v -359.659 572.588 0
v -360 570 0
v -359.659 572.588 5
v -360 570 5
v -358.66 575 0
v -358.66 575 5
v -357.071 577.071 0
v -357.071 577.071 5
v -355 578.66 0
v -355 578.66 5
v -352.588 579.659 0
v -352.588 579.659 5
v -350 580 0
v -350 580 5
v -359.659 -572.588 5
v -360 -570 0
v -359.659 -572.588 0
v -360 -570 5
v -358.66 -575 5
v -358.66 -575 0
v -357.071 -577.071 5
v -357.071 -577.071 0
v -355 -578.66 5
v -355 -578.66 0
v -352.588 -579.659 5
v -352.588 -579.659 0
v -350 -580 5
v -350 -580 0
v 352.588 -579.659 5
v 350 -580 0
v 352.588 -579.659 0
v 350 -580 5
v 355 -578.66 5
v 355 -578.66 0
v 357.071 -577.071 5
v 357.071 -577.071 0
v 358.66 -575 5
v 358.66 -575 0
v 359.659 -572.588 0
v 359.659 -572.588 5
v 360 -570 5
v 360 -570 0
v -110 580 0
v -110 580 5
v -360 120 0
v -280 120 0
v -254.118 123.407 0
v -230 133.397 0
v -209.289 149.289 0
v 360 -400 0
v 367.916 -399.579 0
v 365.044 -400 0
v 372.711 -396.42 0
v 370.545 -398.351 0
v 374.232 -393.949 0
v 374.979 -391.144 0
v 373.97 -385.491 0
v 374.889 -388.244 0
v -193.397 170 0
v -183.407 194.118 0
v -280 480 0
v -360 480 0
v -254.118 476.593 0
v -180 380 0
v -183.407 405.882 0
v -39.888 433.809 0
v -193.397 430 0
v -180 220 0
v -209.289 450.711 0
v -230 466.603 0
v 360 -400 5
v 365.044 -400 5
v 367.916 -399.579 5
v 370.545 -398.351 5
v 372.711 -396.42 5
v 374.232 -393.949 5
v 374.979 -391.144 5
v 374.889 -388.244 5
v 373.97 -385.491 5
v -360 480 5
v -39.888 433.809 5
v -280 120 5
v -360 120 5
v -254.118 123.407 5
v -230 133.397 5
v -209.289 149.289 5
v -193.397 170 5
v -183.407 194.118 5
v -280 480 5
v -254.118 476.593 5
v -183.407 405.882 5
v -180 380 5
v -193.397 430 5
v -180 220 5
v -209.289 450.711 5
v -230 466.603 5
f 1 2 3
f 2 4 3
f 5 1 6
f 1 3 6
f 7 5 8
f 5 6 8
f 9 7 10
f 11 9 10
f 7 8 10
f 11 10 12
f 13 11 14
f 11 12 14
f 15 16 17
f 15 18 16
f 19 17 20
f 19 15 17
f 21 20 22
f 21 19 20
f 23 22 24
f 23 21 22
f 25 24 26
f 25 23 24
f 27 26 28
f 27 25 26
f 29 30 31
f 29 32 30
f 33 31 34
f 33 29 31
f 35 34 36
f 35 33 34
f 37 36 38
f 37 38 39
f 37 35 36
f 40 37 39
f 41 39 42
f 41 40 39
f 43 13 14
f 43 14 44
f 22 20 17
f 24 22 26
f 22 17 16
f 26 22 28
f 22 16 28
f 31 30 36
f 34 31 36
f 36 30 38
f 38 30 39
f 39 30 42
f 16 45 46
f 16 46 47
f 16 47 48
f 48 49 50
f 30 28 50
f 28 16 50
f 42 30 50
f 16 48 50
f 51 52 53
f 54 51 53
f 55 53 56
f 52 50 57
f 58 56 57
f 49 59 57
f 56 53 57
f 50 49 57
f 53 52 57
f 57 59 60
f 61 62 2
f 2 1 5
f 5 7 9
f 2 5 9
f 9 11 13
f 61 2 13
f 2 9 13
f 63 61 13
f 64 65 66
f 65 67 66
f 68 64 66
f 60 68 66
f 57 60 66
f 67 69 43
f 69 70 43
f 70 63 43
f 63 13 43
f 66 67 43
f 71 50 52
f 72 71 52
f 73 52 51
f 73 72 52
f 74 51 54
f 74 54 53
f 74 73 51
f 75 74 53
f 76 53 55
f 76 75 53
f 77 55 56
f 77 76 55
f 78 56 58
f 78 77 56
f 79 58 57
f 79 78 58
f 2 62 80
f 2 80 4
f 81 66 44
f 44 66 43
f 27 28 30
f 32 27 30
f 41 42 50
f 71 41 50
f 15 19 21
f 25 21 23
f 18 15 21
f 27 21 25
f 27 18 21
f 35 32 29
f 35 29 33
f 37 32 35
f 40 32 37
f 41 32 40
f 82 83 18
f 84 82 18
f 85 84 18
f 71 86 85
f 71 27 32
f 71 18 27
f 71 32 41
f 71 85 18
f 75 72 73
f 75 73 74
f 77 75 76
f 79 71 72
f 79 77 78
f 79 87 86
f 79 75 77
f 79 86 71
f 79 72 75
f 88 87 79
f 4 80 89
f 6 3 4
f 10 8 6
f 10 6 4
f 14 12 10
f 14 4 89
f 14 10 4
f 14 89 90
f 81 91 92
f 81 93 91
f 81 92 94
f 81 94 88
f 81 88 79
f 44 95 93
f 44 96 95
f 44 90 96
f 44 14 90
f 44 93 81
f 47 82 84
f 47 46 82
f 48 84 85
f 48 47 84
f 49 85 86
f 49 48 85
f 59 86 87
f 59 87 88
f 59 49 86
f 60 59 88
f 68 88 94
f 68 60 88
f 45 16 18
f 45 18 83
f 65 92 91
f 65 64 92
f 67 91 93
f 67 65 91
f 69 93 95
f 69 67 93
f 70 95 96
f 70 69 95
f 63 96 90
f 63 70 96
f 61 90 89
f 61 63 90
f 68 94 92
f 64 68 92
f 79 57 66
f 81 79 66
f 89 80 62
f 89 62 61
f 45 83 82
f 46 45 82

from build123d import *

# Parameters (mm, degrees)
SKETCH1_W           = 720
SKETCH1_H           = 1160
BOSS_EXTRUDE1_DEPTH = 5
FILLET1_R           = 10
CUT_EXTRUDE1_DEPTH  = 683.6602376
SKETCH3_W           = 360
SKETCH3_H           = 360
CUT_EXTRUDE2_DEPTH  = 683.6602376
FILLET2_R           = 100
BOSS_EXTRUDE2_DEPTH = 5
FILLET3_R           = 10


with BuildPart() as part:
    # Sketch1 → Boss-Extrude1 (new body)
    with BuildSketch(Plane.XY):
        Rectangle(SKETCH1_W, SKETCH1_H)
    extrude(amount=BOSS_EXTRUDE1_DEPTH)

    # Fillet1
    fillet1_edges = [part.edges().sort_by_distance(p)[0] for p in [
        (360, -580, 2.5),
        (-360, -580, 2.5),
        (-360, 580, 2.5),
        (360, 580, 2.5),
    ]]
    fillet(fillet1_edges, radius=FILLET1_R)

    # Sketch2 → Cut-Extrude1 (cut, through all)
    with BuildSketch(Plane(origin=(0, 0, 0), x_dir=(-1, 0, 0), z_dir=(0, 0, -1))):
        Polygon((-360, -400), (110, 580), (-360, 580), align=None)
    extrude(amount=-CUT_EXTRUDE1_DEPTH, mode=Mode.SUBTRACT)

    # Sketch3 → Cut-Extrude2 (cut, through all)
    with BuildSketch(Plane.XY.offset(5)):
        with Locations((-360, 300)):
            Rectangle(SKETCH3_W, SKETCH3_H)
    extrude(amount=-CUT_EXTRUDE2_DEPTH, mode=Mode.SUBTRACT)

    # Fillet2
    fillet2_edges = [part.edges().sort_by_distance(p)[0] for p in [
        (-180, 120, 2.5),
        (-180, 480, 2.5),
    ]]
    fillet(fillet2_edges, radius=FILLET2_R)

    # Sketch4 → Boss-Extrude2 (add)
    with BuildSketch(Plane(origin=(0, 0, 0), x_dir=(-1, 0, 0), z_dir=(0, 0, -1))):
        Polygon((-360, -400), (-381.299239221, -400), (39.887910056, 433.808833734), align=None)
    extrude(amount=-BOSS_EXTRUDE2_DEPTH)

    # Fillet3
    fillet3_edges = [part.edges().sort_by_distance(p)[0] for p in [
        (381.299239221, -400, 2.5),
    ]]
    fillet(fillet3_edges, radius=FILLET3_R)


solid = part.part
